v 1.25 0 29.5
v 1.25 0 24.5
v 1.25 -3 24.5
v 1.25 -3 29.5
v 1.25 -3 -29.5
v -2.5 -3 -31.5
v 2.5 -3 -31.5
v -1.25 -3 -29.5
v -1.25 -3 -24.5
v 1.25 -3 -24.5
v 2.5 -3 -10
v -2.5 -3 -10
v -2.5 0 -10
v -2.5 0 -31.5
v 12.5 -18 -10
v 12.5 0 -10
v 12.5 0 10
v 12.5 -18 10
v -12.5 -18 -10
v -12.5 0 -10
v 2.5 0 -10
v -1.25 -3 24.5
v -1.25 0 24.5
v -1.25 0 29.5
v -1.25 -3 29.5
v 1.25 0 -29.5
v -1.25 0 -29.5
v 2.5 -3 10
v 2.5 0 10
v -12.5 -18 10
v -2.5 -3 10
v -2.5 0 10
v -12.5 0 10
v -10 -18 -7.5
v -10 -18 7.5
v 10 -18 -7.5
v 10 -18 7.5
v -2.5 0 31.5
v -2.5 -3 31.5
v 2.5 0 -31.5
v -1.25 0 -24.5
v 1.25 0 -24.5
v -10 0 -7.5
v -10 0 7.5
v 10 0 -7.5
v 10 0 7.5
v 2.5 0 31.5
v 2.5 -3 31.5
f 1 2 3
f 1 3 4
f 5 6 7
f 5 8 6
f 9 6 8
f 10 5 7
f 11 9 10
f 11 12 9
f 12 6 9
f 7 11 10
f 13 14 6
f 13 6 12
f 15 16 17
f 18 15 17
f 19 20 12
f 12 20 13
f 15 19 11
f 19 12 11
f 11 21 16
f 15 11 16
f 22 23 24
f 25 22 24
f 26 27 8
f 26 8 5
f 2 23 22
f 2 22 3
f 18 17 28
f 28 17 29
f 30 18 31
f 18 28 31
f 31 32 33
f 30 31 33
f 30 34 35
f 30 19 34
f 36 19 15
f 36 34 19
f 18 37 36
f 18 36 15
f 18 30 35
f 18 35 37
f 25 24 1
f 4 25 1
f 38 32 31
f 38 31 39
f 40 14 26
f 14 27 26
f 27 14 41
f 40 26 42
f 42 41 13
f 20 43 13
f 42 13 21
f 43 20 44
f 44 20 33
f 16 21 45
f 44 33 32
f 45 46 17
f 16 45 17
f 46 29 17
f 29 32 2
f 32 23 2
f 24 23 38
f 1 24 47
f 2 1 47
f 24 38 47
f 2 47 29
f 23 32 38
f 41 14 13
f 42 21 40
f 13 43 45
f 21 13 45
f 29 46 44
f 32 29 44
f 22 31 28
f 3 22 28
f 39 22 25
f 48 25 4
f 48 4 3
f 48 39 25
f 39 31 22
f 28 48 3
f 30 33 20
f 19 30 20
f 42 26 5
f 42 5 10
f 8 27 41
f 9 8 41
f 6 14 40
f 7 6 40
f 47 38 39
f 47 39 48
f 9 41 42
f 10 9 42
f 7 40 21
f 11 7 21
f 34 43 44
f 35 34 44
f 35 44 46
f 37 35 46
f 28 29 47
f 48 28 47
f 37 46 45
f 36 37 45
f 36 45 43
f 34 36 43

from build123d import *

# Parameters (mm, degrees)
F0_W     = 5
F0_H     = 21.5
F0_W_2   = 2.5
F0_H_2   = 5
F1_DEPTH = 3
F0_H_3   = 2.5
F2_DEPTH = 18


with BuildPart() as f1:
    # F0 (on Front) → F1 (new body)
    with BuildSketch(Plane.XZ):
        with Locations((0, 20.75)):
            Rectangle(F0_W, F0_H)
        with Locations((0, 27)):
            Rectangle(F0_W_2, F0_H_2, mode=Mode.SUBTRACT)
    extrude(amount=F1_DEPTH)



with BuildPart() as f1b:
    # F0 (on Front) → F1, piece 2 (new body)
    with BuildSketch(Plane.XZ):
        with Locations((0, -20.75)):
            Rectangle(F0_W, F0_H)
        with Locations((0, -27)):
            Rectangle(F0_W_2, F0_H_2, mode=Mode.SUBTRACT)
    extrude(amount=F1_DEPTH)


with BuildPart() as f1_1:
    add(f1.part)

    add(f1b.part)  # F2 merges F1b
    # F0 (on Front) → F2 (join)
    with BuildSketch(Plane.XZ):
        with Locations((0, 8.75)):
            Rectangle(F0_W, F0_H_3)
        Polygon((10, 7.5), (10, -7.5), (2.5, -7.5), (2.5, -10), (12.5, -10), (12.5, 10), (2.5, 10), (2.5, 7.5), align=None)
        with Locations((0, -8.75)):
            Rectangle(F0_W, F0_H_3)
        Polygon((-2.5, -10), (-2.5, -7.5), (-10, -7.5), (-10, 7.5), (-2.5, 7.5), (-2.5, 10), (-12.5, 10), (-12.5, -10), align=None)
    extrude(amount=F2_DEPTH)


solid = f1_1.part
